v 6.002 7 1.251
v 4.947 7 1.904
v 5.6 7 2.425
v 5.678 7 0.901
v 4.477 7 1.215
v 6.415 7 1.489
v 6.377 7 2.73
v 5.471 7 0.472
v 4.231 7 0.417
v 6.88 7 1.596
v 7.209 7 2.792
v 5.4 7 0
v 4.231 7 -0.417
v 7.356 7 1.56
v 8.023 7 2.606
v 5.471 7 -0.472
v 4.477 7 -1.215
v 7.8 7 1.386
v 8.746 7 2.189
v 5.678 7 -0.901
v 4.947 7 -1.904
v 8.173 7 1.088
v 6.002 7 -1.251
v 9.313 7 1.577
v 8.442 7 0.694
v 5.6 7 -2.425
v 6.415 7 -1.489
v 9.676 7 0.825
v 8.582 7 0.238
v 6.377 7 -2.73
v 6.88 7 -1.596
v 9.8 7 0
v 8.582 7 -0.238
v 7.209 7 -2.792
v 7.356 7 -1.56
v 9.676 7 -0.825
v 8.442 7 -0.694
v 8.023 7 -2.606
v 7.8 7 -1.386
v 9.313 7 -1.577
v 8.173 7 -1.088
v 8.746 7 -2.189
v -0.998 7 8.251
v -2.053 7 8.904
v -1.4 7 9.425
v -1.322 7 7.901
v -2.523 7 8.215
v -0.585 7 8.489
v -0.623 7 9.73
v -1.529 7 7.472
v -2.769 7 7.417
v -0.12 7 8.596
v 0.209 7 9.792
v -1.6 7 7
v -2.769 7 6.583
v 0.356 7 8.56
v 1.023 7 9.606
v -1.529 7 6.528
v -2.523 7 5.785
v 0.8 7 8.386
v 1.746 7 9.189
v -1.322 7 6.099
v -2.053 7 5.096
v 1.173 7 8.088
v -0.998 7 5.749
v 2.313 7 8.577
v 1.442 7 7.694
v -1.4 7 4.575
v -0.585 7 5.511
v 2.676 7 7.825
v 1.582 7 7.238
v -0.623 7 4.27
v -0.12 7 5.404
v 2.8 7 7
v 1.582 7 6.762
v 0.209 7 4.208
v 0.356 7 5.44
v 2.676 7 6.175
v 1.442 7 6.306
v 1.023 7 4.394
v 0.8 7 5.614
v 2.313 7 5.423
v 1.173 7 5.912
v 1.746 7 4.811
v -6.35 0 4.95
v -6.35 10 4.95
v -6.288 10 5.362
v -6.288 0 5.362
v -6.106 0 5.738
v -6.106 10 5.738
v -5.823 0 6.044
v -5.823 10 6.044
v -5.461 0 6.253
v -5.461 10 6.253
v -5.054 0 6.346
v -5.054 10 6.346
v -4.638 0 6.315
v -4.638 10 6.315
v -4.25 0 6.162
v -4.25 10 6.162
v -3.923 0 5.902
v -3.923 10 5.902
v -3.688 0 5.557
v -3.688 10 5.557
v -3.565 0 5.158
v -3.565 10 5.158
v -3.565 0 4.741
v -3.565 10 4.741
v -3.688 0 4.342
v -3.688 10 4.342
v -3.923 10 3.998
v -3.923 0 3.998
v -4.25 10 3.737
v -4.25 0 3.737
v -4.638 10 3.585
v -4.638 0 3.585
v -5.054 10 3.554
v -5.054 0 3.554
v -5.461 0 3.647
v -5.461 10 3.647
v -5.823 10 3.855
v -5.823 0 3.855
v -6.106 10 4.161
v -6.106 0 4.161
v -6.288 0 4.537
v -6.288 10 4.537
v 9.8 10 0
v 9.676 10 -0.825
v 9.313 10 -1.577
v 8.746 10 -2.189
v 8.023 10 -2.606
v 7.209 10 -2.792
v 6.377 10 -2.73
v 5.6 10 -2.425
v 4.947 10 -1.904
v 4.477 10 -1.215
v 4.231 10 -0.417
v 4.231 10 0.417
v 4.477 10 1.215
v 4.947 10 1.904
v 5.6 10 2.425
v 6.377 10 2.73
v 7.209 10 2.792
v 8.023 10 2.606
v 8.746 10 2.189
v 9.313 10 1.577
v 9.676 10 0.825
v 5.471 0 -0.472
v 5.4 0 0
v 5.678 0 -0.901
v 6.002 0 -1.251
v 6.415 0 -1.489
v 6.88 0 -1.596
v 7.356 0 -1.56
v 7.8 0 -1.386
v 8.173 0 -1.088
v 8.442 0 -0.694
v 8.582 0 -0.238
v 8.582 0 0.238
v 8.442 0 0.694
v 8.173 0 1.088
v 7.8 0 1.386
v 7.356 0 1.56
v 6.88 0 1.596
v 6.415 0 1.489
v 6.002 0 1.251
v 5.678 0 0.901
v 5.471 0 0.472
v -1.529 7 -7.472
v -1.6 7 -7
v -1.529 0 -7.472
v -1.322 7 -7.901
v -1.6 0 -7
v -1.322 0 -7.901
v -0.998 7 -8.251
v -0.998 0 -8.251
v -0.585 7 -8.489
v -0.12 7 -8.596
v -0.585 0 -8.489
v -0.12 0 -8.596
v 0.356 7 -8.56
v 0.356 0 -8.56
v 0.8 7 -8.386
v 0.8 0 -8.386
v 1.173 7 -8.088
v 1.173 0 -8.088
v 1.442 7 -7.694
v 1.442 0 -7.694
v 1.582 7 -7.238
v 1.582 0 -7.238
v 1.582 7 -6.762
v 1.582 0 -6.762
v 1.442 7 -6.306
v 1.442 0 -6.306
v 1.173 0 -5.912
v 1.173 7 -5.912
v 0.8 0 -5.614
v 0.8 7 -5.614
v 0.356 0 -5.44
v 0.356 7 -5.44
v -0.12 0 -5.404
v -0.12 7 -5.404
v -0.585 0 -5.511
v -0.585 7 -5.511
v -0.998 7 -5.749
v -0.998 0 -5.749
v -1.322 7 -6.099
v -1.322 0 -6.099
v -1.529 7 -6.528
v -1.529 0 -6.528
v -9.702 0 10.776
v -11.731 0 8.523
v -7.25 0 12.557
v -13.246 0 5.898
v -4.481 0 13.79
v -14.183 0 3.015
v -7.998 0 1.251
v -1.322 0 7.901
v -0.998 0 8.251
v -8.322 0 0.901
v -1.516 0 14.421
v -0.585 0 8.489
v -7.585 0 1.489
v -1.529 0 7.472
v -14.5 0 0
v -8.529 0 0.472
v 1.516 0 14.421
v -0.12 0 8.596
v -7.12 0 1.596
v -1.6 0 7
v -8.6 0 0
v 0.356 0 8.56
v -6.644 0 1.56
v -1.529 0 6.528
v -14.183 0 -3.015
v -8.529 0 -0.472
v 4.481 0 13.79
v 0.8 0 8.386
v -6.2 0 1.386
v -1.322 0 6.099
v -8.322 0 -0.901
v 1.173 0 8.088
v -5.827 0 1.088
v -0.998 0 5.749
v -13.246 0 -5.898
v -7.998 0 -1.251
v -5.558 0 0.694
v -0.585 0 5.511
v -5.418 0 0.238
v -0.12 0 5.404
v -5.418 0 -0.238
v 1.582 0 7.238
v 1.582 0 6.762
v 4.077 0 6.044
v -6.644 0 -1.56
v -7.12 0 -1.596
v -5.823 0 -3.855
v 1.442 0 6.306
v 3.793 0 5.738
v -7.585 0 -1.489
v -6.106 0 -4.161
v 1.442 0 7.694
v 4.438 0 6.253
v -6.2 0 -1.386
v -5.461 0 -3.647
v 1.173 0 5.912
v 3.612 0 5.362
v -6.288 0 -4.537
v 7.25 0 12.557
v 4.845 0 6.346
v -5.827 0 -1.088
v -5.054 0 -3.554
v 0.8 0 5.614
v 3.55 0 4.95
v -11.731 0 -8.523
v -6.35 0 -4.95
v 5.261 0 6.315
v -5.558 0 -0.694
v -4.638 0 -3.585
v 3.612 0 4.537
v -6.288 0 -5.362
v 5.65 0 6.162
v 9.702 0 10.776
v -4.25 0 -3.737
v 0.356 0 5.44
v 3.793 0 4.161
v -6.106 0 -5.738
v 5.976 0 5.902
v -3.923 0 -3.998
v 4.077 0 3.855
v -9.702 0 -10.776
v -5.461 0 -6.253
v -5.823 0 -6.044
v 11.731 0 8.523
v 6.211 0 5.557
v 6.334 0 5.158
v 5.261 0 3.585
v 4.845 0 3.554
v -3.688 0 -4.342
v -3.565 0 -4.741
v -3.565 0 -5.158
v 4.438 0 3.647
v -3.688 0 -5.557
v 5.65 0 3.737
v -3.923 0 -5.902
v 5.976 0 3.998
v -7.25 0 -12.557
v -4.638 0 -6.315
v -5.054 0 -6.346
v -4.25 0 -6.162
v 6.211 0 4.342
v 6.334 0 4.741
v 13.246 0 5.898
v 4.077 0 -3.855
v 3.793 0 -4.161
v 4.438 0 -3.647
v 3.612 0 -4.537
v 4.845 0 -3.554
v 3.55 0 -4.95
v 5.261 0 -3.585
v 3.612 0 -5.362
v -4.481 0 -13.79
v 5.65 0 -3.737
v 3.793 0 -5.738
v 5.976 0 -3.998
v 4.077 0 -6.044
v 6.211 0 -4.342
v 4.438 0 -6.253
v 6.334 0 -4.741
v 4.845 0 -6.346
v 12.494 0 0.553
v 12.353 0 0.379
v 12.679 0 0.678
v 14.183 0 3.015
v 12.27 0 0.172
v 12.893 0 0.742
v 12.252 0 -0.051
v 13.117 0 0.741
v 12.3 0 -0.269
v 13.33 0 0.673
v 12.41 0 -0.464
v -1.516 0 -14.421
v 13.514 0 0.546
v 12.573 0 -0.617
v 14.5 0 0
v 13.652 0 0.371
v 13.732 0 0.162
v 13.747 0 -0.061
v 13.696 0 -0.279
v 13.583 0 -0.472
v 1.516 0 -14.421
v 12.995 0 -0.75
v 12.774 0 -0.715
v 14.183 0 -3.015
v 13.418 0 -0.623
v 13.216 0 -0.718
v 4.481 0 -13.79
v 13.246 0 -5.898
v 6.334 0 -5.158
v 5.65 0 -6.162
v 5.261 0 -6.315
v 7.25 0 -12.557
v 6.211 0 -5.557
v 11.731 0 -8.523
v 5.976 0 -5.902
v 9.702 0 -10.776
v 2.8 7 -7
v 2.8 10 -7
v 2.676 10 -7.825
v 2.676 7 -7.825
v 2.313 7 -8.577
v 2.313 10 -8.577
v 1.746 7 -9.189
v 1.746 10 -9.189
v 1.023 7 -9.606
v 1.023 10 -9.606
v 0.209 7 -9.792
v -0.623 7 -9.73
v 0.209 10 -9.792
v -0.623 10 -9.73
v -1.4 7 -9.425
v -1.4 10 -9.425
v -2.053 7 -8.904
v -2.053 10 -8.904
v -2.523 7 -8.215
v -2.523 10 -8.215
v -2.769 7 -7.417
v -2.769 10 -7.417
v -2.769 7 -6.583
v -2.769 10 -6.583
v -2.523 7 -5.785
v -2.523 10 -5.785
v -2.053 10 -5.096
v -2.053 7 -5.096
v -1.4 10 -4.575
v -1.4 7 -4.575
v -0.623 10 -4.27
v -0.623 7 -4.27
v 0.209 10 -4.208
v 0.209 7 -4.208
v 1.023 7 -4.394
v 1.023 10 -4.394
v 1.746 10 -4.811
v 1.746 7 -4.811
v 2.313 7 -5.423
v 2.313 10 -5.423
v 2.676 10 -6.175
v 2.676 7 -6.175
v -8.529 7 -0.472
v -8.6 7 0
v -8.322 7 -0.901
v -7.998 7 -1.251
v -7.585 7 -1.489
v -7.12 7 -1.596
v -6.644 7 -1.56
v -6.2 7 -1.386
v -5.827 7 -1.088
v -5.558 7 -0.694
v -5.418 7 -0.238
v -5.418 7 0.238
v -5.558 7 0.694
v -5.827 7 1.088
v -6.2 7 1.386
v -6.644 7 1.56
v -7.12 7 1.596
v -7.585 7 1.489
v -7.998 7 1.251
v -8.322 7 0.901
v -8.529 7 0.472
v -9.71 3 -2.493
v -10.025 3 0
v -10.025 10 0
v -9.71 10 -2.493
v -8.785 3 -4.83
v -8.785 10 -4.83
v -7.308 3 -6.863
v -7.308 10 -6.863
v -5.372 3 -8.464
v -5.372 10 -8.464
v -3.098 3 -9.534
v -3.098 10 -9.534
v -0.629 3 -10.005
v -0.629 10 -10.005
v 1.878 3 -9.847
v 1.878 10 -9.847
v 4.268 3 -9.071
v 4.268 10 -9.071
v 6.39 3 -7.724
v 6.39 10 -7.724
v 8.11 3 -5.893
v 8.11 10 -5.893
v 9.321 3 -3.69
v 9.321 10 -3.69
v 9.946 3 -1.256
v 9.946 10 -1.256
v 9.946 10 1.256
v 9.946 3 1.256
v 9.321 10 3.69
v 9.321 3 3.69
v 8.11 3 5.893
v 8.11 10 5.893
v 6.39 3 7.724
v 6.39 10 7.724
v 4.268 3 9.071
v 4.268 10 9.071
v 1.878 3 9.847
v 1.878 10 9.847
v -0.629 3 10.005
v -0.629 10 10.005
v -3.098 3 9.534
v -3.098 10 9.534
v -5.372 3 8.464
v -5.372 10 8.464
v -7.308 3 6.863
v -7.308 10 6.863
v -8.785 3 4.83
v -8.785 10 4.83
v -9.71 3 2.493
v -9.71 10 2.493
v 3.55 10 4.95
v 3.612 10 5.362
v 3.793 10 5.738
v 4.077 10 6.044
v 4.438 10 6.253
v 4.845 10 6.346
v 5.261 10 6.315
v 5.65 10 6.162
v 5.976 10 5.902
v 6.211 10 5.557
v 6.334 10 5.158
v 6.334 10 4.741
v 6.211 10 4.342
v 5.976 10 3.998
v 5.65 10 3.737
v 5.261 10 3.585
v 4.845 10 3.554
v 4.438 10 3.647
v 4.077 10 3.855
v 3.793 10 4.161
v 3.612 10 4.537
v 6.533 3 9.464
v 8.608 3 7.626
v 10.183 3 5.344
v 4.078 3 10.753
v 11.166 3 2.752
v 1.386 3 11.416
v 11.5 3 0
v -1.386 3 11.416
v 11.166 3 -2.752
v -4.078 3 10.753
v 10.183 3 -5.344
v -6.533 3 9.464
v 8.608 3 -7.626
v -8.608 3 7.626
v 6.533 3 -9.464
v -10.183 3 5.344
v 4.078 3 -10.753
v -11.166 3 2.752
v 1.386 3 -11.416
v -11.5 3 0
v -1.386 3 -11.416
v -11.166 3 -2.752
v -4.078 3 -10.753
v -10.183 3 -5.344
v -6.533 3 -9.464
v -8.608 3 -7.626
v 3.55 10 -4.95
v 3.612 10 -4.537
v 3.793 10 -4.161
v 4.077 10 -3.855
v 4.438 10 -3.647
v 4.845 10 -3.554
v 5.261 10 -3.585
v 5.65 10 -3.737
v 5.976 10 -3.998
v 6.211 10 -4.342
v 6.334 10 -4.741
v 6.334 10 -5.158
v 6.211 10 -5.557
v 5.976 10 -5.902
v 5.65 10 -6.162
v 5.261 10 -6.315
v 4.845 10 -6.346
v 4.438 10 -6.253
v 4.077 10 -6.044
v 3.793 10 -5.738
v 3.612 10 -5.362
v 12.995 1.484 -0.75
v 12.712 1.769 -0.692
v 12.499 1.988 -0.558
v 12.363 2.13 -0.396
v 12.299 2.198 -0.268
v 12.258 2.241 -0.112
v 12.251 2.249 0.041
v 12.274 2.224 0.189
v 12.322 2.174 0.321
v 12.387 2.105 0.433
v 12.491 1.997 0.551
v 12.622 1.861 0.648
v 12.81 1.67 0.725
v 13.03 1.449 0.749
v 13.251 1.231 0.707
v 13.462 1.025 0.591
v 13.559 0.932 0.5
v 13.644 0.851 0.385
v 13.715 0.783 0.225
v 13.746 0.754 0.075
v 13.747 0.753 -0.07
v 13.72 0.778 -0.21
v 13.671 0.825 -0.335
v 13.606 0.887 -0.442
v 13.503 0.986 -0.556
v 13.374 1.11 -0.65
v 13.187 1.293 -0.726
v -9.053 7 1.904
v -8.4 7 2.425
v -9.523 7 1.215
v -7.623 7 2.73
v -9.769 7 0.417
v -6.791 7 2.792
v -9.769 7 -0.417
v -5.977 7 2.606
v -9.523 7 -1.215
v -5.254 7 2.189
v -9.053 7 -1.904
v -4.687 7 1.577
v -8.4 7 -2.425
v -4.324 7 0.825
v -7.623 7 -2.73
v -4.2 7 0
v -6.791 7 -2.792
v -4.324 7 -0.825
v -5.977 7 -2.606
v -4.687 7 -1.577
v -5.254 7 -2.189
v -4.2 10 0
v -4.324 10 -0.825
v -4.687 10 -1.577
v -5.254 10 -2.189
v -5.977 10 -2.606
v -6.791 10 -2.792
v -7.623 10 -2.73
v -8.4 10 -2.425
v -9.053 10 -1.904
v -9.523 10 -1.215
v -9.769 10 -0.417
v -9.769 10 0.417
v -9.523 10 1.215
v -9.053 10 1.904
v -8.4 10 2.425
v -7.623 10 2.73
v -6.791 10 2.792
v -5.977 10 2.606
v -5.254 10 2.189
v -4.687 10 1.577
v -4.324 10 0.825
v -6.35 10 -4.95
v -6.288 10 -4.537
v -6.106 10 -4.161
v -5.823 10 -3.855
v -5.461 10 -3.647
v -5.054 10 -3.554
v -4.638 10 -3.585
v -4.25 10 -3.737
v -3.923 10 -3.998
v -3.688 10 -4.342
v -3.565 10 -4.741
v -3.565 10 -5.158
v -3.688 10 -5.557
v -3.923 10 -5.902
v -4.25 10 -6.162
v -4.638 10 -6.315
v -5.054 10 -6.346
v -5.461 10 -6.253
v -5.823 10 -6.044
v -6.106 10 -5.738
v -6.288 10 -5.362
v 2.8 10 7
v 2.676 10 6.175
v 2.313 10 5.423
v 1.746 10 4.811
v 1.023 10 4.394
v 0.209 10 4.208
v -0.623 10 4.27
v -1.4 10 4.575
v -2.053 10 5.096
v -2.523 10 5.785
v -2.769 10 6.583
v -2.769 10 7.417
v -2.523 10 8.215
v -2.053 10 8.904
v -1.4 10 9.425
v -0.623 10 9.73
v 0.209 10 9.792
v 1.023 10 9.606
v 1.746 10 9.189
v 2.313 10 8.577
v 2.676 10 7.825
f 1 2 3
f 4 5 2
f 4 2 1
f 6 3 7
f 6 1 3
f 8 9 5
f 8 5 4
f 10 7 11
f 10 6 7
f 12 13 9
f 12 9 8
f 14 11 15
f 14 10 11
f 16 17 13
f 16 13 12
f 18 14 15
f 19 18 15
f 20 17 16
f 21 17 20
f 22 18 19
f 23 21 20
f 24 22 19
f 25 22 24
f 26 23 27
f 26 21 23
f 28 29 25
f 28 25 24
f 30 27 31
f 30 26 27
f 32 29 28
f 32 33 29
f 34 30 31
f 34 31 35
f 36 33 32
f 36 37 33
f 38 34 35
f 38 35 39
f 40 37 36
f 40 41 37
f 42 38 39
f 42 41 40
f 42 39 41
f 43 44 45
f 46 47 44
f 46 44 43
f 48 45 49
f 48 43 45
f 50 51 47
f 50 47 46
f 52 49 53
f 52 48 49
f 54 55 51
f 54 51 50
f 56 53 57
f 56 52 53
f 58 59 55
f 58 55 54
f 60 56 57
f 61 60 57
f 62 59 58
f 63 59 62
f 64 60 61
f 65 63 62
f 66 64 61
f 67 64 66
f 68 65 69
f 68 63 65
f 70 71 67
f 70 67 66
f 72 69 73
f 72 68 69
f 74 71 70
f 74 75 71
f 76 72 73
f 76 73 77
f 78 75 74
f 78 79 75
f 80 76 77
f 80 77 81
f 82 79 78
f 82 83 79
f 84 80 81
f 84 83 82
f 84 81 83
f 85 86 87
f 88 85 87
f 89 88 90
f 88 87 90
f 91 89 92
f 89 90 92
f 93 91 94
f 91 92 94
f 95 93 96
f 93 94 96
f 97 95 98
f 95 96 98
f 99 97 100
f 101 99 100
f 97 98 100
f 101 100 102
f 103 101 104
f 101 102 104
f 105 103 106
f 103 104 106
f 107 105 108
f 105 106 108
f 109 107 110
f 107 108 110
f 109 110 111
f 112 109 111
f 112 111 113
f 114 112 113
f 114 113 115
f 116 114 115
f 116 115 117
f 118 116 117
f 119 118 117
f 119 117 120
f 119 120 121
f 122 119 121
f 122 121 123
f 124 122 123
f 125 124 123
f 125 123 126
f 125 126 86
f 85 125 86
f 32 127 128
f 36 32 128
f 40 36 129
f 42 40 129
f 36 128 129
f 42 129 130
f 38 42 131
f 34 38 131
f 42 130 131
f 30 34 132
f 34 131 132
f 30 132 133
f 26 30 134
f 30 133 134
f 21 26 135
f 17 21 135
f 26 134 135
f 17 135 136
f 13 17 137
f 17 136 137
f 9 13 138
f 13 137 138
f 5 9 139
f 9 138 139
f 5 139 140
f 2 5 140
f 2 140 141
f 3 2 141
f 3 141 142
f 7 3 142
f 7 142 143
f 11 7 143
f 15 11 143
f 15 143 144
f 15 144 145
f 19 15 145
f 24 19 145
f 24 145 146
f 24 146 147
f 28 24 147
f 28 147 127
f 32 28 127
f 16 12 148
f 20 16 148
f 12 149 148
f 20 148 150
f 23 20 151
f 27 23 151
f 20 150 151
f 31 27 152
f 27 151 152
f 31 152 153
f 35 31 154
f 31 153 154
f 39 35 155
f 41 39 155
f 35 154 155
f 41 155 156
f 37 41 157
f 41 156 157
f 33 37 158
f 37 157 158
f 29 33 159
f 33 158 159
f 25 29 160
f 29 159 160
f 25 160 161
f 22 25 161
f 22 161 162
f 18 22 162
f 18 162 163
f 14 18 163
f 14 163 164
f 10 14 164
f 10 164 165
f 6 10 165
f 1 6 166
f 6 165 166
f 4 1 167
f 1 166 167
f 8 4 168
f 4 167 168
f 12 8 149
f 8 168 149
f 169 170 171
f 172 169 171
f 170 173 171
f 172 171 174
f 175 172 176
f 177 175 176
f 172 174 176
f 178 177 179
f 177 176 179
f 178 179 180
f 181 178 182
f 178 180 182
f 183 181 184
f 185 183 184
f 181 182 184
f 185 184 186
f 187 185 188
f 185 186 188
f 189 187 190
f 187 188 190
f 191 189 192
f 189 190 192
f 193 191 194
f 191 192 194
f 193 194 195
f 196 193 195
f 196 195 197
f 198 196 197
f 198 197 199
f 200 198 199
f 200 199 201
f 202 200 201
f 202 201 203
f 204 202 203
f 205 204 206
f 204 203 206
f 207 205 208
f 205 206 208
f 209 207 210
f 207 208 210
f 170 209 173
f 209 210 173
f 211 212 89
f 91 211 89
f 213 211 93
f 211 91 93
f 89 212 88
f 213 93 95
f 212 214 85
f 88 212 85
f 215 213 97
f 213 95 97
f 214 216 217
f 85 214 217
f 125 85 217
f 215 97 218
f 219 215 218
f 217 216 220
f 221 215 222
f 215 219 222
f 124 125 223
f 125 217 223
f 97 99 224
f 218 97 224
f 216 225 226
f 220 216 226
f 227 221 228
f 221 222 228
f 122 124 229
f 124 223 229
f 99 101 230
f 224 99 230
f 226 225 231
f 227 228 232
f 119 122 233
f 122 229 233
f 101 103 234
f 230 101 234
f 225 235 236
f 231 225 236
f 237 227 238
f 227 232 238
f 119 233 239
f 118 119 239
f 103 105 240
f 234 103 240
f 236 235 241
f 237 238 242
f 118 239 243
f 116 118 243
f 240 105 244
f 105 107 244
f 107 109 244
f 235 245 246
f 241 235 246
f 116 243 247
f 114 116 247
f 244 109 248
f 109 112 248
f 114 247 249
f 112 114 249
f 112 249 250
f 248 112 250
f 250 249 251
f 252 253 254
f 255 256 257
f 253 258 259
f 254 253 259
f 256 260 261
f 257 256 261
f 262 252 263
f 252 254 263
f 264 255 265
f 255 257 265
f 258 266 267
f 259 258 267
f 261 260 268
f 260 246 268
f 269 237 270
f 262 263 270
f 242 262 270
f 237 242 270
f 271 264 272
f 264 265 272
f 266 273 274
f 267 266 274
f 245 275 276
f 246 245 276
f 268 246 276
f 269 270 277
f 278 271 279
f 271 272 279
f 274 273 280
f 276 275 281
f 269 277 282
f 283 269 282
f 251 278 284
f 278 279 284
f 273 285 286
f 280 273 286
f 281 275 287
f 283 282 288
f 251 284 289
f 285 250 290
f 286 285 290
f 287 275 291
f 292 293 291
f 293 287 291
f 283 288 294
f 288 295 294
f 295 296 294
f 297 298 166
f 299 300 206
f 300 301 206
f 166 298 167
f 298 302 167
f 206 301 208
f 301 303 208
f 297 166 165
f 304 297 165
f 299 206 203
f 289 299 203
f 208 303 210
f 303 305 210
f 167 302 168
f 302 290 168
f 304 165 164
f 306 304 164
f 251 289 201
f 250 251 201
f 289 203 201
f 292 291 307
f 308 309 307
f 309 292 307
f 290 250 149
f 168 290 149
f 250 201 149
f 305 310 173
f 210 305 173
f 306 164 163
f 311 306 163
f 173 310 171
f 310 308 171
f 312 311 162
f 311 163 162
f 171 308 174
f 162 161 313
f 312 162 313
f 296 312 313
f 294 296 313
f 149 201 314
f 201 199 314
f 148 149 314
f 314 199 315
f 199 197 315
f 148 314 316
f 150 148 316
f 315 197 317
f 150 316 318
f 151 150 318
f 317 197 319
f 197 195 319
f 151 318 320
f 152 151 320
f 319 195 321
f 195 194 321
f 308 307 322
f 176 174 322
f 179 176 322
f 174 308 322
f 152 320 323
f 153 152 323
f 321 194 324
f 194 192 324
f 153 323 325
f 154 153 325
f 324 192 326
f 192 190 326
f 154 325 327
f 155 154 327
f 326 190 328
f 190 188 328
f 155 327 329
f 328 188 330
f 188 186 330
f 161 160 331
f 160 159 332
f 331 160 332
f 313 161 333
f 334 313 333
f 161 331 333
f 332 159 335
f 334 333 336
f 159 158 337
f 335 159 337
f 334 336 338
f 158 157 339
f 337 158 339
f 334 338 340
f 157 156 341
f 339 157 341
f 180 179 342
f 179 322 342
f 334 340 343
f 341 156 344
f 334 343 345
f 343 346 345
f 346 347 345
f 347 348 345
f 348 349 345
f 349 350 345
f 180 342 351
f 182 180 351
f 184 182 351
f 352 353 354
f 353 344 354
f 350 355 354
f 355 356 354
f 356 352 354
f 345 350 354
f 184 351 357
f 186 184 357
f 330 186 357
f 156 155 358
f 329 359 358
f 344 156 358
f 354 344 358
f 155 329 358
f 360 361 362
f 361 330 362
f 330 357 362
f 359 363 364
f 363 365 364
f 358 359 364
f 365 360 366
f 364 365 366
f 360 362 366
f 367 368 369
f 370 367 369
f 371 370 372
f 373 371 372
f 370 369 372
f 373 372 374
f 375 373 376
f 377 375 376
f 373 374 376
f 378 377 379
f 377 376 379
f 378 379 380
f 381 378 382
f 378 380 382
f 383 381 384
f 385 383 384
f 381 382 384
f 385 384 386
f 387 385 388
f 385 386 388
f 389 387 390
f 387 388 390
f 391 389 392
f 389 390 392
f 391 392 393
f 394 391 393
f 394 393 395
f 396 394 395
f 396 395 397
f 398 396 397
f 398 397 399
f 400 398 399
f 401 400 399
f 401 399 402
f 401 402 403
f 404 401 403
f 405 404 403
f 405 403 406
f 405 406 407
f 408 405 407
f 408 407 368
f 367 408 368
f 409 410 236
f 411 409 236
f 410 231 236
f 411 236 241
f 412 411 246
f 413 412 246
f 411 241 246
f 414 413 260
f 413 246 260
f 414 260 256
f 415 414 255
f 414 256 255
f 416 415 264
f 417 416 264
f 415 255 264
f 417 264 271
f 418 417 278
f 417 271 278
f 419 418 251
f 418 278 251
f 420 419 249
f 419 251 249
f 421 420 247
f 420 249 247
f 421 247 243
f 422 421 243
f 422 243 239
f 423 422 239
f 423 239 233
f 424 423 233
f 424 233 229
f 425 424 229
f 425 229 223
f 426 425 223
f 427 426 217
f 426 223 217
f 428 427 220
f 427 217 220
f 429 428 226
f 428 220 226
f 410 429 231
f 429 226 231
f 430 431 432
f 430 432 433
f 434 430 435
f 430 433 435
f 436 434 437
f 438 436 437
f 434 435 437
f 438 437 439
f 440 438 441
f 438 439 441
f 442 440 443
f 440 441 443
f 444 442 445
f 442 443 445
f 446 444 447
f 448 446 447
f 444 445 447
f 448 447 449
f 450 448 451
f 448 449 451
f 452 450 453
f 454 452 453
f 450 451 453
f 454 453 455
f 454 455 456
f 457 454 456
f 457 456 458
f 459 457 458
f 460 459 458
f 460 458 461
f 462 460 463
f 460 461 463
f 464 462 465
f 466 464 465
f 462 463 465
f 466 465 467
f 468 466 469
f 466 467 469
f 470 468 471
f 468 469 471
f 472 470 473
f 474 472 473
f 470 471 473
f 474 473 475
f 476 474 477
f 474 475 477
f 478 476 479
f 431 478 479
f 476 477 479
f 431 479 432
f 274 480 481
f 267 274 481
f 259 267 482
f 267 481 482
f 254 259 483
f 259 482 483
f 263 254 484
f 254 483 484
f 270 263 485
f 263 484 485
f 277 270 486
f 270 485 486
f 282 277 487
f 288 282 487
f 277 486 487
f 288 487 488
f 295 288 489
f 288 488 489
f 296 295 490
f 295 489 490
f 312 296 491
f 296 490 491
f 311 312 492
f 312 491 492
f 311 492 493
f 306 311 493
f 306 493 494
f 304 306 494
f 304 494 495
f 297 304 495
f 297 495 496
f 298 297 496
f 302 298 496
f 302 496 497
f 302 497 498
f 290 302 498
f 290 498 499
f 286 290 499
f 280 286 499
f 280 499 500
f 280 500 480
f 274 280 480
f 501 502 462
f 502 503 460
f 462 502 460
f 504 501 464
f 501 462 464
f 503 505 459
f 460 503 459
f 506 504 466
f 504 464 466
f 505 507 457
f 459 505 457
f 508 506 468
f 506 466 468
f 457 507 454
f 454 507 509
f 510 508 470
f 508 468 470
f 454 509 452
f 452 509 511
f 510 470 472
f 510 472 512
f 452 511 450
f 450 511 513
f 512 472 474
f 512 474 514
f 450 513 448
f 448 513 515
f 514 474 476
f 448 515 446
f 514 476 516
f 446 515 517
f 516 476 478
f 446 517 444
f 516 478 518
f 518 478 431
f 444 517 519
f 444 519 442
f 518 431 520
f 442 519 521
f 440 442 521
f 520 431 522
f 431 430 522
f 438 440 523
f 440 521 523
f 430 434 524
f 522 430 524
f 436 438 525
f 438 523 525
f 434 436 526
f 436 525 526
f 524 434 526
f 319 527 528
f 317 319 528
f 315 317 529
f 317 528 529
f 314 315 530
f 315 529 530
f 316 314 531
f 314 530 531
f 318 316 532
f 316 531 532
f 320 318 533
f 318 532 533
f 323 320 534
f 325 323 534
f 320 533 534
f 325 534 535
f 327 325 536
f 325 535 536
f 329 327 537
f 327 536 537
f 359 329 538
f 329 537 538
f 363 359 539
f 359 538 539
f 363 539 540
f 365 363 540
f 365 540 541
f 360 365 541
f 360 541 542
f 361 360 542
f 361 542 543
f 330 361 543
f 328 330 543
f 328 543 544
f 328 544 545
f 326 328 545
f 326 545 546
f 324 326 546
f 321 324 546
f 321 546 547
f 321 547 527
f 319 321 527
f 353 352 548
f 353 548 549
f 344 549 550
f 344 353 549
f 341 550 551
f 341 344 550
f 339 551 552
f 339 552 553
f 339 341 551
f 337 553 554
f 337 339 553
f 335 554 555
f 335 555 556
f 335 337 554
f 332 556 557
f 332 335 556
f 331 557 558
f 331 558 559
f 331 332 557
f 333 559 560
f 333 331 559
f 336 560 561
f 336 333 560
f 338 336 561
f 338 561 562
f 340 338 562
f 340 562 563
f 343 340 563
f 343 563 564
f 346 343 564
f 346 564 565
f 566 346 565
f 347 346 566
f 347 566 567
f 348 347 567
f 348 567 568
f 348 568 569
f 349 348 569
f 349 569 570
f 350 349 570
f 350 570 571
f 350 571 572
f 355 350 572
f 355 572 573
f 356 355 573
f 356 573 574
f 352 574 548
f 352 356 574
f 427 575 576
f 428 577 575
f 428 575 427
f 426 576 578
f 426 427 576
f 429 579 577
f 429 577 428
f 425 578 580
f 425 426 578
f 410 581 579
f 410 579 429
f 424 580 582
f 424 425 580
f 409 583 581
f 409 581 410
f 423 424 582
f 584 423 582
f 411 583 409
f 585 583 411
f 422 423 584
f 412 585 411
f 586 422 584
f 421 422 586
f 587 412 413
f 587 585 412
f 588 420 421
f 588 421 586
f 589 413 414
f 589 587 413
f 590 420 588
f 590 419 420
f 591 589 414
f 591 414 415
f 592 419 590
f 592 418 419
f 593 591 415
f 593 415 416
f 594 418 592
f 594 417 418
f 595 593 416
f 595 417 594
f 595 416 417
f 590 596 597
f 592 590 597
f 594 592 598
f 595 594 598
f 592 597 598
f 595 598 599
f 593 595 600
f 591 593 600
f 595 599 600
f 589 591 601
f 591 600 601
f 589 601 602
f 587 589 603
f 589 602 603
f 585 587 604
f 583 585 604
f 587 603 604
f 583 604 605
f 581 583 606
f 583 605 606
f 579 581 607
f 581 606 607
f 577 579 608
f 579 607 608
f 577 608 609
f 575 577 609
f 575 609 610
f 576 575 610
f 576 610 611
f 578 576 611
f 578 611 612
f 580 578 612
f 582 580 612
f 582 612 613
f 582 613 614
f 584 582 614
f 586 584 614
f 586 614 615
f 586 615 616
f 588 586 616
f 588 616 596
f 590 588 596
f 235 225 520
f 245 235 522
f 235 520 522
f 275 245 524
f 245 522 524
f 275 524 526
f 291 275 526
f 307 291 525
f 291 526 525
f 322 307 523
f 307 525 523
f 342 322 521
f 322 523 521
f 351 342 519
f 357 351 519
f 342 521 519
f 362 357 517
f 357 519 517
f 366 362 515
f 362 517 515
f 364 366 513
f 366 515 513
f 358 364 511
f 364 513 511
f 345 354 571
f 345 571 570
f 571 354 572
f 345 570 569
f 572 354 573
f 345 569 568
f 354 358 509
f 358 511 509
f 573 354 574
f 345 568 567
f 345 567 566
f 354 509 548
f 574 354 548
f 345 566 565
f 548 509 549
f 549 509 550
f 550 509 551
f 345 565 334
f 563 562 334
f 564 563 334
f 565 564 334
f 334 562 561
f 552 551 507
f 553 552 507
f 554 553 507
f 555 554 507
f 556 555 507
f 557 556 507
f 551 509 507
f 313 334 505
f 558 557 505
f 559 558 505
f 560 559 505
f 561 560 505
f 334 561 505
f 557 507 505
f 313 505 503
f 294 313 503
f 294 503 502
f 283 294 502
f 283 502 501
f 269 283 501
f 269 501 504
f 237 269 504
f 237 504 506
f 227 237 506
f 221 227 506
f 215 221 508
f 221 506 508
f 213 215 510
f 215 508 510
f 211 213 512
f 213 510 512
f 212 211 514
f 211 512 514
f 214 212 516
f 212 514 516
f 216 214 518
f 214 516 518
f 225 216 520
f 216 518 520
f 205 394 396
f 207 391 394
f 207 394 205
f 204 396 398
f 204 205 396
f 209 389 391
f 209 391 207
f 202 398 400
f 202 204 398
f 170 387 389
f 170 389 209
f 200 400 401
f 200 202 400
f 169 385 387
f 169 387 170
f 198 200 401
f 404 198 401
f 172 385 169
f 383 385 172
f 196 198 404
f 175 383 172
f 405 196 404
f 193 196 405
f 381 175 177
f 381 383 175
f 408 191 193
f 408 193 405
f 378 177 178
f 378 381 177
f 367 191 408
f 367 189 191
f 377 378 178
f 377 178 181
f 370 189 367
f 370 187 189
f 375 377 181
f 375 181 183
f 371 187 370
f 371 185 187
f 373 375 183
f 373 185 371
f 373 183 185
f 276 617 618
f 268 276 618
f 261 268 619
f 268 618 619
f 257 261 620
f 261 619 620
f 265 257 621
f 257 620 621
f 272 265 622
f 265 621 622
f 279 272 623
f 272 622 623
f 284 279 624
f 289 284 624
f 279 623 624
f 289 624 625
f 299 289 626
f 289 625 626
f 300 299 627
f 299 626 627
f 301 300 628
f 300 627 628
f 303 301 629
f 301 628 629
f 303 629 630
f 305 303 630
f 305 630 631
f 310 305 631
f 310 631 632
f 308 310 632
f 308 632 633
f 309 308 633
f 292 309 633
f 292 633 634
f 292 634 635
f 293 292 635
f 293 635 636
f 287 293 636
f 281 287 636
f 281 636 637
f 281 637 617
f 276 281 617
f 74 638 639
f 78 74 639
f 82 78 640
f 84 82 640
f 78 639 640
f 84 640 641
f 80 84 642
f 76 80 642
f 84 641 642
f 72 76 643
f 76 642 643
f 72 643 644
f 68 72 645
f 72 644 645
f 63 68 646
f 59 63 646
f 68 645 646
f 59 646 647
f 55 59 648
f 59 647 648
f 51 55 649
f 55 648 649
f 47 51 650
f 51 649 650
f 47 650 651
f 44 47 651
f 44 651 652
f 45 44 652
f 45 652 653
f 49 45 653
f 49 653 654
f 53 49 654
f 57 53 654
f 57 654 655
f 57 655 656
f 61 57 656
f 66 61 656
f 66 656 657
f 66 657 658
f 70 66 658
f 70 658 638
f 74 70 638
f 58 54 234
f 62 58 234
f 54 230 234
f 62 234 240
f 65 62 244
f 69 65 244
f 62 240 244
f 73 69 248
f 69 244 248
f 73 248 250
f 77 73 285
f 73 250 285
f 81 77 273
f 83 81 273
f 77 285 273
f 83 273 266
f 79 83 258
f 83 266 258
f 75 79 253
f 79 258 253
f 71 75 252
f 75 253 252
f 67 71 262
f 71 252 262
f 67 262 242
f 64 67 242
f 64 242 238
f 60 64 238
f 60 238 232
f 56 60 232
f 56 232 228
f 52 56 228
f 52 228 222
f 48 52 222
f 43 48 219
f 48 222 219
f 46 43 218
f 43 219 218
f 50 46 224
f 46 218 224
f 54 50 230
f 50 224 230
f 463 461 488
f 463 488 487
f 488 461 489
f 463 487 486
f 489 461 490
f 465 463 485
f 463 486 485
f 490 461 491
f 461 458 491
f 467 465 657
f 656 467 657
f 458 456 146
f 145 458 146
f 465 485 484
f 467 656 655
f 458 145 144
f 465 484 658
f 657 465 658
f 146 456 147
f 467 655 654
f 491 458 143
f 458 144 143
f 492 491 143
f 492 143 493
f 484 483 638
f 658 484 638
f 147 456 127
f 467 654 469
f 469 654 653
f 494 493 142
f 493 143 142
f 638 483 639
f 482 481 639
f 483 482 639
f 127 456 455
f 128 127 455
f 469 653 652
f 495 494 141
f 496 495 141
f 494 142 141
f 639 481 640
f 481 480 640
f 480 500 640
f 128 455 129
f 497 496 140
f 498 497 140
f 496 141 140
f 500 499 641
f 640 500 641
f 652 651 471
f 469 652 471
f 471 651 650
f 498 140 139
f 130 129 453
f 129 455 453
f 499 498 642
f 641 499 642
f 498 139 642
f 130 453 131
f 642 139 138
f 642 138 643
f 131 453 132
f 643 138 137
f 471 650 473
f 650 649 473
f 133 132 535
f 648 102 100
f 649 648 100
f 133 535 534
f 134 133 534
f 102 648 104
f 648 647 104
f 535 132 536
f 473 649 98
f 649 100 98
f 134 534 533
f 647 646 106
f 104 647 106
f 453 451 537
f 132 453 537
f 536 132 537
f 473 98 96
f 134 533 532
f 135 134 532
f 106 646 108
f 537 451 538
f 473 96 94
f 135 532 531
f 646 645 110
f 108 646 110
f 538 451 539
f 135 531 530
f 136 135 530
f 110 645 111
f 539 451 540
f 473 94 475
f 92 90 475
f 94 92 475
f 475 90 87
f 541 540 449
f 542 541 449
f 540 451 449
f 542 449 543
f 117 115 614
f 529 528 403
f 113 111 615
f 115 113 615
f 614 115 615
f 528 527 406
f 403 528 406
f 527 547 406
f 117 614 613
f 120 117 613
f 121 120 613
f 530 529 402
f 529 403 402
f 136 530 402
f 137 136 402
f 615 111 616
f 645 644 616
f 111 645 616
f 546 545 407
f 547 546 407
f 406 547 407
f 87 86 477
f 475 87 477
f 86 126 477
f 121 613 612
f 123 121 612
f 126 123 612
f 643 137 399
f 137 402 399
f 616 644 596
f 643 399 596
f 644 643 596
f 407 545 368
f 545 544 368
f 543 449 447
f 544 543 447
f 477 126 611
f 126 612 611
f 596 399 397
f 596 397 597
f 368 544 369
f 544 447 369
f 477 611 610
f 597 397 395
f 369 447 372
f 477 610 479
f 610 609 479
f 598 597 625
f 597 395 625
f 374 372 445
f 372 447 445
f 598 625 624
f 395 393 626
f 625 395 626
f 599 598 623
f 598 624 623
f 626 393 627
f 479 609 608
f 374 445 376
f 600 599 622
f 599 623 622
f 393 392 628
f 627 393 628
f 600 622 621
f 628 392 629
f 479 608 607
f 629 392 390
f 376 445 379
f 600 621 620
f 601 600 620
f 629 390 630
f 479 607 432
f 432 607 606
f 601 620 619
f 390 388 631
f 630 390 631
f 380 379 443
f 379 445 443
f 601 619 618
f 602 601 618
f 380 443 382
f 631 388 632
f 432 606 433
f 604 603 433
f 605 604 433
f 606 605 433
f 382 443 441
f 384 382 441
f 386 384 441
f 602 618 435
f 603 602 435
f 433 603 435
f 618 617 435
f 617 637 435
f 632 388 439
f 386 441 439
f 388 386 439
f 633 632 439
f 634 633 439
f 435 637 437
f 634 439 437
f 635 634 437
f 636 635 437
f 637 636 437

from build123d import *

# Parameters (mm, degrees)
SKETCH2_R                               = 1.4
CUT_EXTRUDE1_DEPTH                      = 23.814469093
CBORE_FOR_M5_HEX_HEAD_BOLT1_D           = 3.2
CBORE_FOR_M5_HEX_HEAD_BOLT1_CBORE_D     = 5.6
CBORE_FOR_M5_HEX_HEAD_BOLT1_CBORE_DEPTH = 3
SKETCH4_R                               = 0.75
CUT_EXTRUDE3_DEPTH                      = 23.814469093


with BuildPart() as part:
    # Sketch1 → Revolve1 (revolve)
    with BuildSketch(Plane.XY, mode=Mode.PRIVATE) as revolve1_sk:
        Polygon((14.5, 0), (11.5, 3), (10.025, 3), (10.025, 10), (0, 10), (0, 0), align=None)
    revolve(revolve1_sk.sketch.rotate(Axis((0, 10, 0), (0, -1, 0)), 180), axis=Axis((0, 10, 0), (0, -1, 0)))

    # Sketch2 → Cut-Extrude1 (cut, through all)
    with BuildSketch(Plane(origin=(0, 10, 0), x_dir=(1, 0, 0), z_dir=(0, 1, 0))):
        with Locations(Location((0, 7, 0), (0, 0, 180))):
            Circle(SKETCH2_R)
        with Locations(Location((4.949747468, 4.949747468, 0), (0, 0, 180))):
            Circle(SKETCH2_R)
        with Locations(Location((7, 0, 0), (0, 0, 180))):
            Circle(SKETCH2_R)
        with Locations(Location((4.949747468, -4.949747468, 0), (0, 0, 180))):
            Circle(SKETCH2_R)
        with Locations(Location((0, -7, 0), (0, 0, 180))):
            Circle(SKETCH2_R)
        with Locations(Location((-4.949747468, -4.949747468, 0), (0, 0, 180))):
            Circle(SKETCH2_R)
        with Locations(Location((-7, 0, 0), (0, 0, 180))):
            Circle(SKETCH2_R)
        with Locations(Location((-4.949747468, 4.949747468, 0), (0, 0, 180))):
            Circle(SKETCH2_R)
    extrude(amount=-CUT_EXTRUDE1_DEPTH, mode=Mode.SUBTRACT)

    # CBORE for M5 Hex Head Bolt1 (through all)
    with Locations(Plane(origin=(0, 10, -7), x_dir=(1, 0, 0), z_dir=(0, 1, 0))):
        with Locations((0, 0), (-7, -7), (0, -14), (7, -7)):
            CounterBoreHole(CBORE_FOR_M5_HEX_HEAD_BOLT1_D / 2, CBORE_FOR_M5_HEX_HEAD_BOLT1_CBORE_D / 2, CBORE_FOR_M5_HEX_HEAD_BOLT1_CBORE_DEPTH)

    # Sketch4 → Cut-Extrude3 (cut, through all)
    with BuildSketch(Plane(origin=(0, 0, 0), x_dir=(1, 0, 0), z_dir=(0, 1, 0))):
        with Locations(Location((13, 0, 0), (0, 0, 90.394644161))):
            Circle(SKETCH4_R)
    extrude(amount=CUT_EXTRUDE3_DEPTH, mode=Mode.SUBTRACT)


solid = part.part
